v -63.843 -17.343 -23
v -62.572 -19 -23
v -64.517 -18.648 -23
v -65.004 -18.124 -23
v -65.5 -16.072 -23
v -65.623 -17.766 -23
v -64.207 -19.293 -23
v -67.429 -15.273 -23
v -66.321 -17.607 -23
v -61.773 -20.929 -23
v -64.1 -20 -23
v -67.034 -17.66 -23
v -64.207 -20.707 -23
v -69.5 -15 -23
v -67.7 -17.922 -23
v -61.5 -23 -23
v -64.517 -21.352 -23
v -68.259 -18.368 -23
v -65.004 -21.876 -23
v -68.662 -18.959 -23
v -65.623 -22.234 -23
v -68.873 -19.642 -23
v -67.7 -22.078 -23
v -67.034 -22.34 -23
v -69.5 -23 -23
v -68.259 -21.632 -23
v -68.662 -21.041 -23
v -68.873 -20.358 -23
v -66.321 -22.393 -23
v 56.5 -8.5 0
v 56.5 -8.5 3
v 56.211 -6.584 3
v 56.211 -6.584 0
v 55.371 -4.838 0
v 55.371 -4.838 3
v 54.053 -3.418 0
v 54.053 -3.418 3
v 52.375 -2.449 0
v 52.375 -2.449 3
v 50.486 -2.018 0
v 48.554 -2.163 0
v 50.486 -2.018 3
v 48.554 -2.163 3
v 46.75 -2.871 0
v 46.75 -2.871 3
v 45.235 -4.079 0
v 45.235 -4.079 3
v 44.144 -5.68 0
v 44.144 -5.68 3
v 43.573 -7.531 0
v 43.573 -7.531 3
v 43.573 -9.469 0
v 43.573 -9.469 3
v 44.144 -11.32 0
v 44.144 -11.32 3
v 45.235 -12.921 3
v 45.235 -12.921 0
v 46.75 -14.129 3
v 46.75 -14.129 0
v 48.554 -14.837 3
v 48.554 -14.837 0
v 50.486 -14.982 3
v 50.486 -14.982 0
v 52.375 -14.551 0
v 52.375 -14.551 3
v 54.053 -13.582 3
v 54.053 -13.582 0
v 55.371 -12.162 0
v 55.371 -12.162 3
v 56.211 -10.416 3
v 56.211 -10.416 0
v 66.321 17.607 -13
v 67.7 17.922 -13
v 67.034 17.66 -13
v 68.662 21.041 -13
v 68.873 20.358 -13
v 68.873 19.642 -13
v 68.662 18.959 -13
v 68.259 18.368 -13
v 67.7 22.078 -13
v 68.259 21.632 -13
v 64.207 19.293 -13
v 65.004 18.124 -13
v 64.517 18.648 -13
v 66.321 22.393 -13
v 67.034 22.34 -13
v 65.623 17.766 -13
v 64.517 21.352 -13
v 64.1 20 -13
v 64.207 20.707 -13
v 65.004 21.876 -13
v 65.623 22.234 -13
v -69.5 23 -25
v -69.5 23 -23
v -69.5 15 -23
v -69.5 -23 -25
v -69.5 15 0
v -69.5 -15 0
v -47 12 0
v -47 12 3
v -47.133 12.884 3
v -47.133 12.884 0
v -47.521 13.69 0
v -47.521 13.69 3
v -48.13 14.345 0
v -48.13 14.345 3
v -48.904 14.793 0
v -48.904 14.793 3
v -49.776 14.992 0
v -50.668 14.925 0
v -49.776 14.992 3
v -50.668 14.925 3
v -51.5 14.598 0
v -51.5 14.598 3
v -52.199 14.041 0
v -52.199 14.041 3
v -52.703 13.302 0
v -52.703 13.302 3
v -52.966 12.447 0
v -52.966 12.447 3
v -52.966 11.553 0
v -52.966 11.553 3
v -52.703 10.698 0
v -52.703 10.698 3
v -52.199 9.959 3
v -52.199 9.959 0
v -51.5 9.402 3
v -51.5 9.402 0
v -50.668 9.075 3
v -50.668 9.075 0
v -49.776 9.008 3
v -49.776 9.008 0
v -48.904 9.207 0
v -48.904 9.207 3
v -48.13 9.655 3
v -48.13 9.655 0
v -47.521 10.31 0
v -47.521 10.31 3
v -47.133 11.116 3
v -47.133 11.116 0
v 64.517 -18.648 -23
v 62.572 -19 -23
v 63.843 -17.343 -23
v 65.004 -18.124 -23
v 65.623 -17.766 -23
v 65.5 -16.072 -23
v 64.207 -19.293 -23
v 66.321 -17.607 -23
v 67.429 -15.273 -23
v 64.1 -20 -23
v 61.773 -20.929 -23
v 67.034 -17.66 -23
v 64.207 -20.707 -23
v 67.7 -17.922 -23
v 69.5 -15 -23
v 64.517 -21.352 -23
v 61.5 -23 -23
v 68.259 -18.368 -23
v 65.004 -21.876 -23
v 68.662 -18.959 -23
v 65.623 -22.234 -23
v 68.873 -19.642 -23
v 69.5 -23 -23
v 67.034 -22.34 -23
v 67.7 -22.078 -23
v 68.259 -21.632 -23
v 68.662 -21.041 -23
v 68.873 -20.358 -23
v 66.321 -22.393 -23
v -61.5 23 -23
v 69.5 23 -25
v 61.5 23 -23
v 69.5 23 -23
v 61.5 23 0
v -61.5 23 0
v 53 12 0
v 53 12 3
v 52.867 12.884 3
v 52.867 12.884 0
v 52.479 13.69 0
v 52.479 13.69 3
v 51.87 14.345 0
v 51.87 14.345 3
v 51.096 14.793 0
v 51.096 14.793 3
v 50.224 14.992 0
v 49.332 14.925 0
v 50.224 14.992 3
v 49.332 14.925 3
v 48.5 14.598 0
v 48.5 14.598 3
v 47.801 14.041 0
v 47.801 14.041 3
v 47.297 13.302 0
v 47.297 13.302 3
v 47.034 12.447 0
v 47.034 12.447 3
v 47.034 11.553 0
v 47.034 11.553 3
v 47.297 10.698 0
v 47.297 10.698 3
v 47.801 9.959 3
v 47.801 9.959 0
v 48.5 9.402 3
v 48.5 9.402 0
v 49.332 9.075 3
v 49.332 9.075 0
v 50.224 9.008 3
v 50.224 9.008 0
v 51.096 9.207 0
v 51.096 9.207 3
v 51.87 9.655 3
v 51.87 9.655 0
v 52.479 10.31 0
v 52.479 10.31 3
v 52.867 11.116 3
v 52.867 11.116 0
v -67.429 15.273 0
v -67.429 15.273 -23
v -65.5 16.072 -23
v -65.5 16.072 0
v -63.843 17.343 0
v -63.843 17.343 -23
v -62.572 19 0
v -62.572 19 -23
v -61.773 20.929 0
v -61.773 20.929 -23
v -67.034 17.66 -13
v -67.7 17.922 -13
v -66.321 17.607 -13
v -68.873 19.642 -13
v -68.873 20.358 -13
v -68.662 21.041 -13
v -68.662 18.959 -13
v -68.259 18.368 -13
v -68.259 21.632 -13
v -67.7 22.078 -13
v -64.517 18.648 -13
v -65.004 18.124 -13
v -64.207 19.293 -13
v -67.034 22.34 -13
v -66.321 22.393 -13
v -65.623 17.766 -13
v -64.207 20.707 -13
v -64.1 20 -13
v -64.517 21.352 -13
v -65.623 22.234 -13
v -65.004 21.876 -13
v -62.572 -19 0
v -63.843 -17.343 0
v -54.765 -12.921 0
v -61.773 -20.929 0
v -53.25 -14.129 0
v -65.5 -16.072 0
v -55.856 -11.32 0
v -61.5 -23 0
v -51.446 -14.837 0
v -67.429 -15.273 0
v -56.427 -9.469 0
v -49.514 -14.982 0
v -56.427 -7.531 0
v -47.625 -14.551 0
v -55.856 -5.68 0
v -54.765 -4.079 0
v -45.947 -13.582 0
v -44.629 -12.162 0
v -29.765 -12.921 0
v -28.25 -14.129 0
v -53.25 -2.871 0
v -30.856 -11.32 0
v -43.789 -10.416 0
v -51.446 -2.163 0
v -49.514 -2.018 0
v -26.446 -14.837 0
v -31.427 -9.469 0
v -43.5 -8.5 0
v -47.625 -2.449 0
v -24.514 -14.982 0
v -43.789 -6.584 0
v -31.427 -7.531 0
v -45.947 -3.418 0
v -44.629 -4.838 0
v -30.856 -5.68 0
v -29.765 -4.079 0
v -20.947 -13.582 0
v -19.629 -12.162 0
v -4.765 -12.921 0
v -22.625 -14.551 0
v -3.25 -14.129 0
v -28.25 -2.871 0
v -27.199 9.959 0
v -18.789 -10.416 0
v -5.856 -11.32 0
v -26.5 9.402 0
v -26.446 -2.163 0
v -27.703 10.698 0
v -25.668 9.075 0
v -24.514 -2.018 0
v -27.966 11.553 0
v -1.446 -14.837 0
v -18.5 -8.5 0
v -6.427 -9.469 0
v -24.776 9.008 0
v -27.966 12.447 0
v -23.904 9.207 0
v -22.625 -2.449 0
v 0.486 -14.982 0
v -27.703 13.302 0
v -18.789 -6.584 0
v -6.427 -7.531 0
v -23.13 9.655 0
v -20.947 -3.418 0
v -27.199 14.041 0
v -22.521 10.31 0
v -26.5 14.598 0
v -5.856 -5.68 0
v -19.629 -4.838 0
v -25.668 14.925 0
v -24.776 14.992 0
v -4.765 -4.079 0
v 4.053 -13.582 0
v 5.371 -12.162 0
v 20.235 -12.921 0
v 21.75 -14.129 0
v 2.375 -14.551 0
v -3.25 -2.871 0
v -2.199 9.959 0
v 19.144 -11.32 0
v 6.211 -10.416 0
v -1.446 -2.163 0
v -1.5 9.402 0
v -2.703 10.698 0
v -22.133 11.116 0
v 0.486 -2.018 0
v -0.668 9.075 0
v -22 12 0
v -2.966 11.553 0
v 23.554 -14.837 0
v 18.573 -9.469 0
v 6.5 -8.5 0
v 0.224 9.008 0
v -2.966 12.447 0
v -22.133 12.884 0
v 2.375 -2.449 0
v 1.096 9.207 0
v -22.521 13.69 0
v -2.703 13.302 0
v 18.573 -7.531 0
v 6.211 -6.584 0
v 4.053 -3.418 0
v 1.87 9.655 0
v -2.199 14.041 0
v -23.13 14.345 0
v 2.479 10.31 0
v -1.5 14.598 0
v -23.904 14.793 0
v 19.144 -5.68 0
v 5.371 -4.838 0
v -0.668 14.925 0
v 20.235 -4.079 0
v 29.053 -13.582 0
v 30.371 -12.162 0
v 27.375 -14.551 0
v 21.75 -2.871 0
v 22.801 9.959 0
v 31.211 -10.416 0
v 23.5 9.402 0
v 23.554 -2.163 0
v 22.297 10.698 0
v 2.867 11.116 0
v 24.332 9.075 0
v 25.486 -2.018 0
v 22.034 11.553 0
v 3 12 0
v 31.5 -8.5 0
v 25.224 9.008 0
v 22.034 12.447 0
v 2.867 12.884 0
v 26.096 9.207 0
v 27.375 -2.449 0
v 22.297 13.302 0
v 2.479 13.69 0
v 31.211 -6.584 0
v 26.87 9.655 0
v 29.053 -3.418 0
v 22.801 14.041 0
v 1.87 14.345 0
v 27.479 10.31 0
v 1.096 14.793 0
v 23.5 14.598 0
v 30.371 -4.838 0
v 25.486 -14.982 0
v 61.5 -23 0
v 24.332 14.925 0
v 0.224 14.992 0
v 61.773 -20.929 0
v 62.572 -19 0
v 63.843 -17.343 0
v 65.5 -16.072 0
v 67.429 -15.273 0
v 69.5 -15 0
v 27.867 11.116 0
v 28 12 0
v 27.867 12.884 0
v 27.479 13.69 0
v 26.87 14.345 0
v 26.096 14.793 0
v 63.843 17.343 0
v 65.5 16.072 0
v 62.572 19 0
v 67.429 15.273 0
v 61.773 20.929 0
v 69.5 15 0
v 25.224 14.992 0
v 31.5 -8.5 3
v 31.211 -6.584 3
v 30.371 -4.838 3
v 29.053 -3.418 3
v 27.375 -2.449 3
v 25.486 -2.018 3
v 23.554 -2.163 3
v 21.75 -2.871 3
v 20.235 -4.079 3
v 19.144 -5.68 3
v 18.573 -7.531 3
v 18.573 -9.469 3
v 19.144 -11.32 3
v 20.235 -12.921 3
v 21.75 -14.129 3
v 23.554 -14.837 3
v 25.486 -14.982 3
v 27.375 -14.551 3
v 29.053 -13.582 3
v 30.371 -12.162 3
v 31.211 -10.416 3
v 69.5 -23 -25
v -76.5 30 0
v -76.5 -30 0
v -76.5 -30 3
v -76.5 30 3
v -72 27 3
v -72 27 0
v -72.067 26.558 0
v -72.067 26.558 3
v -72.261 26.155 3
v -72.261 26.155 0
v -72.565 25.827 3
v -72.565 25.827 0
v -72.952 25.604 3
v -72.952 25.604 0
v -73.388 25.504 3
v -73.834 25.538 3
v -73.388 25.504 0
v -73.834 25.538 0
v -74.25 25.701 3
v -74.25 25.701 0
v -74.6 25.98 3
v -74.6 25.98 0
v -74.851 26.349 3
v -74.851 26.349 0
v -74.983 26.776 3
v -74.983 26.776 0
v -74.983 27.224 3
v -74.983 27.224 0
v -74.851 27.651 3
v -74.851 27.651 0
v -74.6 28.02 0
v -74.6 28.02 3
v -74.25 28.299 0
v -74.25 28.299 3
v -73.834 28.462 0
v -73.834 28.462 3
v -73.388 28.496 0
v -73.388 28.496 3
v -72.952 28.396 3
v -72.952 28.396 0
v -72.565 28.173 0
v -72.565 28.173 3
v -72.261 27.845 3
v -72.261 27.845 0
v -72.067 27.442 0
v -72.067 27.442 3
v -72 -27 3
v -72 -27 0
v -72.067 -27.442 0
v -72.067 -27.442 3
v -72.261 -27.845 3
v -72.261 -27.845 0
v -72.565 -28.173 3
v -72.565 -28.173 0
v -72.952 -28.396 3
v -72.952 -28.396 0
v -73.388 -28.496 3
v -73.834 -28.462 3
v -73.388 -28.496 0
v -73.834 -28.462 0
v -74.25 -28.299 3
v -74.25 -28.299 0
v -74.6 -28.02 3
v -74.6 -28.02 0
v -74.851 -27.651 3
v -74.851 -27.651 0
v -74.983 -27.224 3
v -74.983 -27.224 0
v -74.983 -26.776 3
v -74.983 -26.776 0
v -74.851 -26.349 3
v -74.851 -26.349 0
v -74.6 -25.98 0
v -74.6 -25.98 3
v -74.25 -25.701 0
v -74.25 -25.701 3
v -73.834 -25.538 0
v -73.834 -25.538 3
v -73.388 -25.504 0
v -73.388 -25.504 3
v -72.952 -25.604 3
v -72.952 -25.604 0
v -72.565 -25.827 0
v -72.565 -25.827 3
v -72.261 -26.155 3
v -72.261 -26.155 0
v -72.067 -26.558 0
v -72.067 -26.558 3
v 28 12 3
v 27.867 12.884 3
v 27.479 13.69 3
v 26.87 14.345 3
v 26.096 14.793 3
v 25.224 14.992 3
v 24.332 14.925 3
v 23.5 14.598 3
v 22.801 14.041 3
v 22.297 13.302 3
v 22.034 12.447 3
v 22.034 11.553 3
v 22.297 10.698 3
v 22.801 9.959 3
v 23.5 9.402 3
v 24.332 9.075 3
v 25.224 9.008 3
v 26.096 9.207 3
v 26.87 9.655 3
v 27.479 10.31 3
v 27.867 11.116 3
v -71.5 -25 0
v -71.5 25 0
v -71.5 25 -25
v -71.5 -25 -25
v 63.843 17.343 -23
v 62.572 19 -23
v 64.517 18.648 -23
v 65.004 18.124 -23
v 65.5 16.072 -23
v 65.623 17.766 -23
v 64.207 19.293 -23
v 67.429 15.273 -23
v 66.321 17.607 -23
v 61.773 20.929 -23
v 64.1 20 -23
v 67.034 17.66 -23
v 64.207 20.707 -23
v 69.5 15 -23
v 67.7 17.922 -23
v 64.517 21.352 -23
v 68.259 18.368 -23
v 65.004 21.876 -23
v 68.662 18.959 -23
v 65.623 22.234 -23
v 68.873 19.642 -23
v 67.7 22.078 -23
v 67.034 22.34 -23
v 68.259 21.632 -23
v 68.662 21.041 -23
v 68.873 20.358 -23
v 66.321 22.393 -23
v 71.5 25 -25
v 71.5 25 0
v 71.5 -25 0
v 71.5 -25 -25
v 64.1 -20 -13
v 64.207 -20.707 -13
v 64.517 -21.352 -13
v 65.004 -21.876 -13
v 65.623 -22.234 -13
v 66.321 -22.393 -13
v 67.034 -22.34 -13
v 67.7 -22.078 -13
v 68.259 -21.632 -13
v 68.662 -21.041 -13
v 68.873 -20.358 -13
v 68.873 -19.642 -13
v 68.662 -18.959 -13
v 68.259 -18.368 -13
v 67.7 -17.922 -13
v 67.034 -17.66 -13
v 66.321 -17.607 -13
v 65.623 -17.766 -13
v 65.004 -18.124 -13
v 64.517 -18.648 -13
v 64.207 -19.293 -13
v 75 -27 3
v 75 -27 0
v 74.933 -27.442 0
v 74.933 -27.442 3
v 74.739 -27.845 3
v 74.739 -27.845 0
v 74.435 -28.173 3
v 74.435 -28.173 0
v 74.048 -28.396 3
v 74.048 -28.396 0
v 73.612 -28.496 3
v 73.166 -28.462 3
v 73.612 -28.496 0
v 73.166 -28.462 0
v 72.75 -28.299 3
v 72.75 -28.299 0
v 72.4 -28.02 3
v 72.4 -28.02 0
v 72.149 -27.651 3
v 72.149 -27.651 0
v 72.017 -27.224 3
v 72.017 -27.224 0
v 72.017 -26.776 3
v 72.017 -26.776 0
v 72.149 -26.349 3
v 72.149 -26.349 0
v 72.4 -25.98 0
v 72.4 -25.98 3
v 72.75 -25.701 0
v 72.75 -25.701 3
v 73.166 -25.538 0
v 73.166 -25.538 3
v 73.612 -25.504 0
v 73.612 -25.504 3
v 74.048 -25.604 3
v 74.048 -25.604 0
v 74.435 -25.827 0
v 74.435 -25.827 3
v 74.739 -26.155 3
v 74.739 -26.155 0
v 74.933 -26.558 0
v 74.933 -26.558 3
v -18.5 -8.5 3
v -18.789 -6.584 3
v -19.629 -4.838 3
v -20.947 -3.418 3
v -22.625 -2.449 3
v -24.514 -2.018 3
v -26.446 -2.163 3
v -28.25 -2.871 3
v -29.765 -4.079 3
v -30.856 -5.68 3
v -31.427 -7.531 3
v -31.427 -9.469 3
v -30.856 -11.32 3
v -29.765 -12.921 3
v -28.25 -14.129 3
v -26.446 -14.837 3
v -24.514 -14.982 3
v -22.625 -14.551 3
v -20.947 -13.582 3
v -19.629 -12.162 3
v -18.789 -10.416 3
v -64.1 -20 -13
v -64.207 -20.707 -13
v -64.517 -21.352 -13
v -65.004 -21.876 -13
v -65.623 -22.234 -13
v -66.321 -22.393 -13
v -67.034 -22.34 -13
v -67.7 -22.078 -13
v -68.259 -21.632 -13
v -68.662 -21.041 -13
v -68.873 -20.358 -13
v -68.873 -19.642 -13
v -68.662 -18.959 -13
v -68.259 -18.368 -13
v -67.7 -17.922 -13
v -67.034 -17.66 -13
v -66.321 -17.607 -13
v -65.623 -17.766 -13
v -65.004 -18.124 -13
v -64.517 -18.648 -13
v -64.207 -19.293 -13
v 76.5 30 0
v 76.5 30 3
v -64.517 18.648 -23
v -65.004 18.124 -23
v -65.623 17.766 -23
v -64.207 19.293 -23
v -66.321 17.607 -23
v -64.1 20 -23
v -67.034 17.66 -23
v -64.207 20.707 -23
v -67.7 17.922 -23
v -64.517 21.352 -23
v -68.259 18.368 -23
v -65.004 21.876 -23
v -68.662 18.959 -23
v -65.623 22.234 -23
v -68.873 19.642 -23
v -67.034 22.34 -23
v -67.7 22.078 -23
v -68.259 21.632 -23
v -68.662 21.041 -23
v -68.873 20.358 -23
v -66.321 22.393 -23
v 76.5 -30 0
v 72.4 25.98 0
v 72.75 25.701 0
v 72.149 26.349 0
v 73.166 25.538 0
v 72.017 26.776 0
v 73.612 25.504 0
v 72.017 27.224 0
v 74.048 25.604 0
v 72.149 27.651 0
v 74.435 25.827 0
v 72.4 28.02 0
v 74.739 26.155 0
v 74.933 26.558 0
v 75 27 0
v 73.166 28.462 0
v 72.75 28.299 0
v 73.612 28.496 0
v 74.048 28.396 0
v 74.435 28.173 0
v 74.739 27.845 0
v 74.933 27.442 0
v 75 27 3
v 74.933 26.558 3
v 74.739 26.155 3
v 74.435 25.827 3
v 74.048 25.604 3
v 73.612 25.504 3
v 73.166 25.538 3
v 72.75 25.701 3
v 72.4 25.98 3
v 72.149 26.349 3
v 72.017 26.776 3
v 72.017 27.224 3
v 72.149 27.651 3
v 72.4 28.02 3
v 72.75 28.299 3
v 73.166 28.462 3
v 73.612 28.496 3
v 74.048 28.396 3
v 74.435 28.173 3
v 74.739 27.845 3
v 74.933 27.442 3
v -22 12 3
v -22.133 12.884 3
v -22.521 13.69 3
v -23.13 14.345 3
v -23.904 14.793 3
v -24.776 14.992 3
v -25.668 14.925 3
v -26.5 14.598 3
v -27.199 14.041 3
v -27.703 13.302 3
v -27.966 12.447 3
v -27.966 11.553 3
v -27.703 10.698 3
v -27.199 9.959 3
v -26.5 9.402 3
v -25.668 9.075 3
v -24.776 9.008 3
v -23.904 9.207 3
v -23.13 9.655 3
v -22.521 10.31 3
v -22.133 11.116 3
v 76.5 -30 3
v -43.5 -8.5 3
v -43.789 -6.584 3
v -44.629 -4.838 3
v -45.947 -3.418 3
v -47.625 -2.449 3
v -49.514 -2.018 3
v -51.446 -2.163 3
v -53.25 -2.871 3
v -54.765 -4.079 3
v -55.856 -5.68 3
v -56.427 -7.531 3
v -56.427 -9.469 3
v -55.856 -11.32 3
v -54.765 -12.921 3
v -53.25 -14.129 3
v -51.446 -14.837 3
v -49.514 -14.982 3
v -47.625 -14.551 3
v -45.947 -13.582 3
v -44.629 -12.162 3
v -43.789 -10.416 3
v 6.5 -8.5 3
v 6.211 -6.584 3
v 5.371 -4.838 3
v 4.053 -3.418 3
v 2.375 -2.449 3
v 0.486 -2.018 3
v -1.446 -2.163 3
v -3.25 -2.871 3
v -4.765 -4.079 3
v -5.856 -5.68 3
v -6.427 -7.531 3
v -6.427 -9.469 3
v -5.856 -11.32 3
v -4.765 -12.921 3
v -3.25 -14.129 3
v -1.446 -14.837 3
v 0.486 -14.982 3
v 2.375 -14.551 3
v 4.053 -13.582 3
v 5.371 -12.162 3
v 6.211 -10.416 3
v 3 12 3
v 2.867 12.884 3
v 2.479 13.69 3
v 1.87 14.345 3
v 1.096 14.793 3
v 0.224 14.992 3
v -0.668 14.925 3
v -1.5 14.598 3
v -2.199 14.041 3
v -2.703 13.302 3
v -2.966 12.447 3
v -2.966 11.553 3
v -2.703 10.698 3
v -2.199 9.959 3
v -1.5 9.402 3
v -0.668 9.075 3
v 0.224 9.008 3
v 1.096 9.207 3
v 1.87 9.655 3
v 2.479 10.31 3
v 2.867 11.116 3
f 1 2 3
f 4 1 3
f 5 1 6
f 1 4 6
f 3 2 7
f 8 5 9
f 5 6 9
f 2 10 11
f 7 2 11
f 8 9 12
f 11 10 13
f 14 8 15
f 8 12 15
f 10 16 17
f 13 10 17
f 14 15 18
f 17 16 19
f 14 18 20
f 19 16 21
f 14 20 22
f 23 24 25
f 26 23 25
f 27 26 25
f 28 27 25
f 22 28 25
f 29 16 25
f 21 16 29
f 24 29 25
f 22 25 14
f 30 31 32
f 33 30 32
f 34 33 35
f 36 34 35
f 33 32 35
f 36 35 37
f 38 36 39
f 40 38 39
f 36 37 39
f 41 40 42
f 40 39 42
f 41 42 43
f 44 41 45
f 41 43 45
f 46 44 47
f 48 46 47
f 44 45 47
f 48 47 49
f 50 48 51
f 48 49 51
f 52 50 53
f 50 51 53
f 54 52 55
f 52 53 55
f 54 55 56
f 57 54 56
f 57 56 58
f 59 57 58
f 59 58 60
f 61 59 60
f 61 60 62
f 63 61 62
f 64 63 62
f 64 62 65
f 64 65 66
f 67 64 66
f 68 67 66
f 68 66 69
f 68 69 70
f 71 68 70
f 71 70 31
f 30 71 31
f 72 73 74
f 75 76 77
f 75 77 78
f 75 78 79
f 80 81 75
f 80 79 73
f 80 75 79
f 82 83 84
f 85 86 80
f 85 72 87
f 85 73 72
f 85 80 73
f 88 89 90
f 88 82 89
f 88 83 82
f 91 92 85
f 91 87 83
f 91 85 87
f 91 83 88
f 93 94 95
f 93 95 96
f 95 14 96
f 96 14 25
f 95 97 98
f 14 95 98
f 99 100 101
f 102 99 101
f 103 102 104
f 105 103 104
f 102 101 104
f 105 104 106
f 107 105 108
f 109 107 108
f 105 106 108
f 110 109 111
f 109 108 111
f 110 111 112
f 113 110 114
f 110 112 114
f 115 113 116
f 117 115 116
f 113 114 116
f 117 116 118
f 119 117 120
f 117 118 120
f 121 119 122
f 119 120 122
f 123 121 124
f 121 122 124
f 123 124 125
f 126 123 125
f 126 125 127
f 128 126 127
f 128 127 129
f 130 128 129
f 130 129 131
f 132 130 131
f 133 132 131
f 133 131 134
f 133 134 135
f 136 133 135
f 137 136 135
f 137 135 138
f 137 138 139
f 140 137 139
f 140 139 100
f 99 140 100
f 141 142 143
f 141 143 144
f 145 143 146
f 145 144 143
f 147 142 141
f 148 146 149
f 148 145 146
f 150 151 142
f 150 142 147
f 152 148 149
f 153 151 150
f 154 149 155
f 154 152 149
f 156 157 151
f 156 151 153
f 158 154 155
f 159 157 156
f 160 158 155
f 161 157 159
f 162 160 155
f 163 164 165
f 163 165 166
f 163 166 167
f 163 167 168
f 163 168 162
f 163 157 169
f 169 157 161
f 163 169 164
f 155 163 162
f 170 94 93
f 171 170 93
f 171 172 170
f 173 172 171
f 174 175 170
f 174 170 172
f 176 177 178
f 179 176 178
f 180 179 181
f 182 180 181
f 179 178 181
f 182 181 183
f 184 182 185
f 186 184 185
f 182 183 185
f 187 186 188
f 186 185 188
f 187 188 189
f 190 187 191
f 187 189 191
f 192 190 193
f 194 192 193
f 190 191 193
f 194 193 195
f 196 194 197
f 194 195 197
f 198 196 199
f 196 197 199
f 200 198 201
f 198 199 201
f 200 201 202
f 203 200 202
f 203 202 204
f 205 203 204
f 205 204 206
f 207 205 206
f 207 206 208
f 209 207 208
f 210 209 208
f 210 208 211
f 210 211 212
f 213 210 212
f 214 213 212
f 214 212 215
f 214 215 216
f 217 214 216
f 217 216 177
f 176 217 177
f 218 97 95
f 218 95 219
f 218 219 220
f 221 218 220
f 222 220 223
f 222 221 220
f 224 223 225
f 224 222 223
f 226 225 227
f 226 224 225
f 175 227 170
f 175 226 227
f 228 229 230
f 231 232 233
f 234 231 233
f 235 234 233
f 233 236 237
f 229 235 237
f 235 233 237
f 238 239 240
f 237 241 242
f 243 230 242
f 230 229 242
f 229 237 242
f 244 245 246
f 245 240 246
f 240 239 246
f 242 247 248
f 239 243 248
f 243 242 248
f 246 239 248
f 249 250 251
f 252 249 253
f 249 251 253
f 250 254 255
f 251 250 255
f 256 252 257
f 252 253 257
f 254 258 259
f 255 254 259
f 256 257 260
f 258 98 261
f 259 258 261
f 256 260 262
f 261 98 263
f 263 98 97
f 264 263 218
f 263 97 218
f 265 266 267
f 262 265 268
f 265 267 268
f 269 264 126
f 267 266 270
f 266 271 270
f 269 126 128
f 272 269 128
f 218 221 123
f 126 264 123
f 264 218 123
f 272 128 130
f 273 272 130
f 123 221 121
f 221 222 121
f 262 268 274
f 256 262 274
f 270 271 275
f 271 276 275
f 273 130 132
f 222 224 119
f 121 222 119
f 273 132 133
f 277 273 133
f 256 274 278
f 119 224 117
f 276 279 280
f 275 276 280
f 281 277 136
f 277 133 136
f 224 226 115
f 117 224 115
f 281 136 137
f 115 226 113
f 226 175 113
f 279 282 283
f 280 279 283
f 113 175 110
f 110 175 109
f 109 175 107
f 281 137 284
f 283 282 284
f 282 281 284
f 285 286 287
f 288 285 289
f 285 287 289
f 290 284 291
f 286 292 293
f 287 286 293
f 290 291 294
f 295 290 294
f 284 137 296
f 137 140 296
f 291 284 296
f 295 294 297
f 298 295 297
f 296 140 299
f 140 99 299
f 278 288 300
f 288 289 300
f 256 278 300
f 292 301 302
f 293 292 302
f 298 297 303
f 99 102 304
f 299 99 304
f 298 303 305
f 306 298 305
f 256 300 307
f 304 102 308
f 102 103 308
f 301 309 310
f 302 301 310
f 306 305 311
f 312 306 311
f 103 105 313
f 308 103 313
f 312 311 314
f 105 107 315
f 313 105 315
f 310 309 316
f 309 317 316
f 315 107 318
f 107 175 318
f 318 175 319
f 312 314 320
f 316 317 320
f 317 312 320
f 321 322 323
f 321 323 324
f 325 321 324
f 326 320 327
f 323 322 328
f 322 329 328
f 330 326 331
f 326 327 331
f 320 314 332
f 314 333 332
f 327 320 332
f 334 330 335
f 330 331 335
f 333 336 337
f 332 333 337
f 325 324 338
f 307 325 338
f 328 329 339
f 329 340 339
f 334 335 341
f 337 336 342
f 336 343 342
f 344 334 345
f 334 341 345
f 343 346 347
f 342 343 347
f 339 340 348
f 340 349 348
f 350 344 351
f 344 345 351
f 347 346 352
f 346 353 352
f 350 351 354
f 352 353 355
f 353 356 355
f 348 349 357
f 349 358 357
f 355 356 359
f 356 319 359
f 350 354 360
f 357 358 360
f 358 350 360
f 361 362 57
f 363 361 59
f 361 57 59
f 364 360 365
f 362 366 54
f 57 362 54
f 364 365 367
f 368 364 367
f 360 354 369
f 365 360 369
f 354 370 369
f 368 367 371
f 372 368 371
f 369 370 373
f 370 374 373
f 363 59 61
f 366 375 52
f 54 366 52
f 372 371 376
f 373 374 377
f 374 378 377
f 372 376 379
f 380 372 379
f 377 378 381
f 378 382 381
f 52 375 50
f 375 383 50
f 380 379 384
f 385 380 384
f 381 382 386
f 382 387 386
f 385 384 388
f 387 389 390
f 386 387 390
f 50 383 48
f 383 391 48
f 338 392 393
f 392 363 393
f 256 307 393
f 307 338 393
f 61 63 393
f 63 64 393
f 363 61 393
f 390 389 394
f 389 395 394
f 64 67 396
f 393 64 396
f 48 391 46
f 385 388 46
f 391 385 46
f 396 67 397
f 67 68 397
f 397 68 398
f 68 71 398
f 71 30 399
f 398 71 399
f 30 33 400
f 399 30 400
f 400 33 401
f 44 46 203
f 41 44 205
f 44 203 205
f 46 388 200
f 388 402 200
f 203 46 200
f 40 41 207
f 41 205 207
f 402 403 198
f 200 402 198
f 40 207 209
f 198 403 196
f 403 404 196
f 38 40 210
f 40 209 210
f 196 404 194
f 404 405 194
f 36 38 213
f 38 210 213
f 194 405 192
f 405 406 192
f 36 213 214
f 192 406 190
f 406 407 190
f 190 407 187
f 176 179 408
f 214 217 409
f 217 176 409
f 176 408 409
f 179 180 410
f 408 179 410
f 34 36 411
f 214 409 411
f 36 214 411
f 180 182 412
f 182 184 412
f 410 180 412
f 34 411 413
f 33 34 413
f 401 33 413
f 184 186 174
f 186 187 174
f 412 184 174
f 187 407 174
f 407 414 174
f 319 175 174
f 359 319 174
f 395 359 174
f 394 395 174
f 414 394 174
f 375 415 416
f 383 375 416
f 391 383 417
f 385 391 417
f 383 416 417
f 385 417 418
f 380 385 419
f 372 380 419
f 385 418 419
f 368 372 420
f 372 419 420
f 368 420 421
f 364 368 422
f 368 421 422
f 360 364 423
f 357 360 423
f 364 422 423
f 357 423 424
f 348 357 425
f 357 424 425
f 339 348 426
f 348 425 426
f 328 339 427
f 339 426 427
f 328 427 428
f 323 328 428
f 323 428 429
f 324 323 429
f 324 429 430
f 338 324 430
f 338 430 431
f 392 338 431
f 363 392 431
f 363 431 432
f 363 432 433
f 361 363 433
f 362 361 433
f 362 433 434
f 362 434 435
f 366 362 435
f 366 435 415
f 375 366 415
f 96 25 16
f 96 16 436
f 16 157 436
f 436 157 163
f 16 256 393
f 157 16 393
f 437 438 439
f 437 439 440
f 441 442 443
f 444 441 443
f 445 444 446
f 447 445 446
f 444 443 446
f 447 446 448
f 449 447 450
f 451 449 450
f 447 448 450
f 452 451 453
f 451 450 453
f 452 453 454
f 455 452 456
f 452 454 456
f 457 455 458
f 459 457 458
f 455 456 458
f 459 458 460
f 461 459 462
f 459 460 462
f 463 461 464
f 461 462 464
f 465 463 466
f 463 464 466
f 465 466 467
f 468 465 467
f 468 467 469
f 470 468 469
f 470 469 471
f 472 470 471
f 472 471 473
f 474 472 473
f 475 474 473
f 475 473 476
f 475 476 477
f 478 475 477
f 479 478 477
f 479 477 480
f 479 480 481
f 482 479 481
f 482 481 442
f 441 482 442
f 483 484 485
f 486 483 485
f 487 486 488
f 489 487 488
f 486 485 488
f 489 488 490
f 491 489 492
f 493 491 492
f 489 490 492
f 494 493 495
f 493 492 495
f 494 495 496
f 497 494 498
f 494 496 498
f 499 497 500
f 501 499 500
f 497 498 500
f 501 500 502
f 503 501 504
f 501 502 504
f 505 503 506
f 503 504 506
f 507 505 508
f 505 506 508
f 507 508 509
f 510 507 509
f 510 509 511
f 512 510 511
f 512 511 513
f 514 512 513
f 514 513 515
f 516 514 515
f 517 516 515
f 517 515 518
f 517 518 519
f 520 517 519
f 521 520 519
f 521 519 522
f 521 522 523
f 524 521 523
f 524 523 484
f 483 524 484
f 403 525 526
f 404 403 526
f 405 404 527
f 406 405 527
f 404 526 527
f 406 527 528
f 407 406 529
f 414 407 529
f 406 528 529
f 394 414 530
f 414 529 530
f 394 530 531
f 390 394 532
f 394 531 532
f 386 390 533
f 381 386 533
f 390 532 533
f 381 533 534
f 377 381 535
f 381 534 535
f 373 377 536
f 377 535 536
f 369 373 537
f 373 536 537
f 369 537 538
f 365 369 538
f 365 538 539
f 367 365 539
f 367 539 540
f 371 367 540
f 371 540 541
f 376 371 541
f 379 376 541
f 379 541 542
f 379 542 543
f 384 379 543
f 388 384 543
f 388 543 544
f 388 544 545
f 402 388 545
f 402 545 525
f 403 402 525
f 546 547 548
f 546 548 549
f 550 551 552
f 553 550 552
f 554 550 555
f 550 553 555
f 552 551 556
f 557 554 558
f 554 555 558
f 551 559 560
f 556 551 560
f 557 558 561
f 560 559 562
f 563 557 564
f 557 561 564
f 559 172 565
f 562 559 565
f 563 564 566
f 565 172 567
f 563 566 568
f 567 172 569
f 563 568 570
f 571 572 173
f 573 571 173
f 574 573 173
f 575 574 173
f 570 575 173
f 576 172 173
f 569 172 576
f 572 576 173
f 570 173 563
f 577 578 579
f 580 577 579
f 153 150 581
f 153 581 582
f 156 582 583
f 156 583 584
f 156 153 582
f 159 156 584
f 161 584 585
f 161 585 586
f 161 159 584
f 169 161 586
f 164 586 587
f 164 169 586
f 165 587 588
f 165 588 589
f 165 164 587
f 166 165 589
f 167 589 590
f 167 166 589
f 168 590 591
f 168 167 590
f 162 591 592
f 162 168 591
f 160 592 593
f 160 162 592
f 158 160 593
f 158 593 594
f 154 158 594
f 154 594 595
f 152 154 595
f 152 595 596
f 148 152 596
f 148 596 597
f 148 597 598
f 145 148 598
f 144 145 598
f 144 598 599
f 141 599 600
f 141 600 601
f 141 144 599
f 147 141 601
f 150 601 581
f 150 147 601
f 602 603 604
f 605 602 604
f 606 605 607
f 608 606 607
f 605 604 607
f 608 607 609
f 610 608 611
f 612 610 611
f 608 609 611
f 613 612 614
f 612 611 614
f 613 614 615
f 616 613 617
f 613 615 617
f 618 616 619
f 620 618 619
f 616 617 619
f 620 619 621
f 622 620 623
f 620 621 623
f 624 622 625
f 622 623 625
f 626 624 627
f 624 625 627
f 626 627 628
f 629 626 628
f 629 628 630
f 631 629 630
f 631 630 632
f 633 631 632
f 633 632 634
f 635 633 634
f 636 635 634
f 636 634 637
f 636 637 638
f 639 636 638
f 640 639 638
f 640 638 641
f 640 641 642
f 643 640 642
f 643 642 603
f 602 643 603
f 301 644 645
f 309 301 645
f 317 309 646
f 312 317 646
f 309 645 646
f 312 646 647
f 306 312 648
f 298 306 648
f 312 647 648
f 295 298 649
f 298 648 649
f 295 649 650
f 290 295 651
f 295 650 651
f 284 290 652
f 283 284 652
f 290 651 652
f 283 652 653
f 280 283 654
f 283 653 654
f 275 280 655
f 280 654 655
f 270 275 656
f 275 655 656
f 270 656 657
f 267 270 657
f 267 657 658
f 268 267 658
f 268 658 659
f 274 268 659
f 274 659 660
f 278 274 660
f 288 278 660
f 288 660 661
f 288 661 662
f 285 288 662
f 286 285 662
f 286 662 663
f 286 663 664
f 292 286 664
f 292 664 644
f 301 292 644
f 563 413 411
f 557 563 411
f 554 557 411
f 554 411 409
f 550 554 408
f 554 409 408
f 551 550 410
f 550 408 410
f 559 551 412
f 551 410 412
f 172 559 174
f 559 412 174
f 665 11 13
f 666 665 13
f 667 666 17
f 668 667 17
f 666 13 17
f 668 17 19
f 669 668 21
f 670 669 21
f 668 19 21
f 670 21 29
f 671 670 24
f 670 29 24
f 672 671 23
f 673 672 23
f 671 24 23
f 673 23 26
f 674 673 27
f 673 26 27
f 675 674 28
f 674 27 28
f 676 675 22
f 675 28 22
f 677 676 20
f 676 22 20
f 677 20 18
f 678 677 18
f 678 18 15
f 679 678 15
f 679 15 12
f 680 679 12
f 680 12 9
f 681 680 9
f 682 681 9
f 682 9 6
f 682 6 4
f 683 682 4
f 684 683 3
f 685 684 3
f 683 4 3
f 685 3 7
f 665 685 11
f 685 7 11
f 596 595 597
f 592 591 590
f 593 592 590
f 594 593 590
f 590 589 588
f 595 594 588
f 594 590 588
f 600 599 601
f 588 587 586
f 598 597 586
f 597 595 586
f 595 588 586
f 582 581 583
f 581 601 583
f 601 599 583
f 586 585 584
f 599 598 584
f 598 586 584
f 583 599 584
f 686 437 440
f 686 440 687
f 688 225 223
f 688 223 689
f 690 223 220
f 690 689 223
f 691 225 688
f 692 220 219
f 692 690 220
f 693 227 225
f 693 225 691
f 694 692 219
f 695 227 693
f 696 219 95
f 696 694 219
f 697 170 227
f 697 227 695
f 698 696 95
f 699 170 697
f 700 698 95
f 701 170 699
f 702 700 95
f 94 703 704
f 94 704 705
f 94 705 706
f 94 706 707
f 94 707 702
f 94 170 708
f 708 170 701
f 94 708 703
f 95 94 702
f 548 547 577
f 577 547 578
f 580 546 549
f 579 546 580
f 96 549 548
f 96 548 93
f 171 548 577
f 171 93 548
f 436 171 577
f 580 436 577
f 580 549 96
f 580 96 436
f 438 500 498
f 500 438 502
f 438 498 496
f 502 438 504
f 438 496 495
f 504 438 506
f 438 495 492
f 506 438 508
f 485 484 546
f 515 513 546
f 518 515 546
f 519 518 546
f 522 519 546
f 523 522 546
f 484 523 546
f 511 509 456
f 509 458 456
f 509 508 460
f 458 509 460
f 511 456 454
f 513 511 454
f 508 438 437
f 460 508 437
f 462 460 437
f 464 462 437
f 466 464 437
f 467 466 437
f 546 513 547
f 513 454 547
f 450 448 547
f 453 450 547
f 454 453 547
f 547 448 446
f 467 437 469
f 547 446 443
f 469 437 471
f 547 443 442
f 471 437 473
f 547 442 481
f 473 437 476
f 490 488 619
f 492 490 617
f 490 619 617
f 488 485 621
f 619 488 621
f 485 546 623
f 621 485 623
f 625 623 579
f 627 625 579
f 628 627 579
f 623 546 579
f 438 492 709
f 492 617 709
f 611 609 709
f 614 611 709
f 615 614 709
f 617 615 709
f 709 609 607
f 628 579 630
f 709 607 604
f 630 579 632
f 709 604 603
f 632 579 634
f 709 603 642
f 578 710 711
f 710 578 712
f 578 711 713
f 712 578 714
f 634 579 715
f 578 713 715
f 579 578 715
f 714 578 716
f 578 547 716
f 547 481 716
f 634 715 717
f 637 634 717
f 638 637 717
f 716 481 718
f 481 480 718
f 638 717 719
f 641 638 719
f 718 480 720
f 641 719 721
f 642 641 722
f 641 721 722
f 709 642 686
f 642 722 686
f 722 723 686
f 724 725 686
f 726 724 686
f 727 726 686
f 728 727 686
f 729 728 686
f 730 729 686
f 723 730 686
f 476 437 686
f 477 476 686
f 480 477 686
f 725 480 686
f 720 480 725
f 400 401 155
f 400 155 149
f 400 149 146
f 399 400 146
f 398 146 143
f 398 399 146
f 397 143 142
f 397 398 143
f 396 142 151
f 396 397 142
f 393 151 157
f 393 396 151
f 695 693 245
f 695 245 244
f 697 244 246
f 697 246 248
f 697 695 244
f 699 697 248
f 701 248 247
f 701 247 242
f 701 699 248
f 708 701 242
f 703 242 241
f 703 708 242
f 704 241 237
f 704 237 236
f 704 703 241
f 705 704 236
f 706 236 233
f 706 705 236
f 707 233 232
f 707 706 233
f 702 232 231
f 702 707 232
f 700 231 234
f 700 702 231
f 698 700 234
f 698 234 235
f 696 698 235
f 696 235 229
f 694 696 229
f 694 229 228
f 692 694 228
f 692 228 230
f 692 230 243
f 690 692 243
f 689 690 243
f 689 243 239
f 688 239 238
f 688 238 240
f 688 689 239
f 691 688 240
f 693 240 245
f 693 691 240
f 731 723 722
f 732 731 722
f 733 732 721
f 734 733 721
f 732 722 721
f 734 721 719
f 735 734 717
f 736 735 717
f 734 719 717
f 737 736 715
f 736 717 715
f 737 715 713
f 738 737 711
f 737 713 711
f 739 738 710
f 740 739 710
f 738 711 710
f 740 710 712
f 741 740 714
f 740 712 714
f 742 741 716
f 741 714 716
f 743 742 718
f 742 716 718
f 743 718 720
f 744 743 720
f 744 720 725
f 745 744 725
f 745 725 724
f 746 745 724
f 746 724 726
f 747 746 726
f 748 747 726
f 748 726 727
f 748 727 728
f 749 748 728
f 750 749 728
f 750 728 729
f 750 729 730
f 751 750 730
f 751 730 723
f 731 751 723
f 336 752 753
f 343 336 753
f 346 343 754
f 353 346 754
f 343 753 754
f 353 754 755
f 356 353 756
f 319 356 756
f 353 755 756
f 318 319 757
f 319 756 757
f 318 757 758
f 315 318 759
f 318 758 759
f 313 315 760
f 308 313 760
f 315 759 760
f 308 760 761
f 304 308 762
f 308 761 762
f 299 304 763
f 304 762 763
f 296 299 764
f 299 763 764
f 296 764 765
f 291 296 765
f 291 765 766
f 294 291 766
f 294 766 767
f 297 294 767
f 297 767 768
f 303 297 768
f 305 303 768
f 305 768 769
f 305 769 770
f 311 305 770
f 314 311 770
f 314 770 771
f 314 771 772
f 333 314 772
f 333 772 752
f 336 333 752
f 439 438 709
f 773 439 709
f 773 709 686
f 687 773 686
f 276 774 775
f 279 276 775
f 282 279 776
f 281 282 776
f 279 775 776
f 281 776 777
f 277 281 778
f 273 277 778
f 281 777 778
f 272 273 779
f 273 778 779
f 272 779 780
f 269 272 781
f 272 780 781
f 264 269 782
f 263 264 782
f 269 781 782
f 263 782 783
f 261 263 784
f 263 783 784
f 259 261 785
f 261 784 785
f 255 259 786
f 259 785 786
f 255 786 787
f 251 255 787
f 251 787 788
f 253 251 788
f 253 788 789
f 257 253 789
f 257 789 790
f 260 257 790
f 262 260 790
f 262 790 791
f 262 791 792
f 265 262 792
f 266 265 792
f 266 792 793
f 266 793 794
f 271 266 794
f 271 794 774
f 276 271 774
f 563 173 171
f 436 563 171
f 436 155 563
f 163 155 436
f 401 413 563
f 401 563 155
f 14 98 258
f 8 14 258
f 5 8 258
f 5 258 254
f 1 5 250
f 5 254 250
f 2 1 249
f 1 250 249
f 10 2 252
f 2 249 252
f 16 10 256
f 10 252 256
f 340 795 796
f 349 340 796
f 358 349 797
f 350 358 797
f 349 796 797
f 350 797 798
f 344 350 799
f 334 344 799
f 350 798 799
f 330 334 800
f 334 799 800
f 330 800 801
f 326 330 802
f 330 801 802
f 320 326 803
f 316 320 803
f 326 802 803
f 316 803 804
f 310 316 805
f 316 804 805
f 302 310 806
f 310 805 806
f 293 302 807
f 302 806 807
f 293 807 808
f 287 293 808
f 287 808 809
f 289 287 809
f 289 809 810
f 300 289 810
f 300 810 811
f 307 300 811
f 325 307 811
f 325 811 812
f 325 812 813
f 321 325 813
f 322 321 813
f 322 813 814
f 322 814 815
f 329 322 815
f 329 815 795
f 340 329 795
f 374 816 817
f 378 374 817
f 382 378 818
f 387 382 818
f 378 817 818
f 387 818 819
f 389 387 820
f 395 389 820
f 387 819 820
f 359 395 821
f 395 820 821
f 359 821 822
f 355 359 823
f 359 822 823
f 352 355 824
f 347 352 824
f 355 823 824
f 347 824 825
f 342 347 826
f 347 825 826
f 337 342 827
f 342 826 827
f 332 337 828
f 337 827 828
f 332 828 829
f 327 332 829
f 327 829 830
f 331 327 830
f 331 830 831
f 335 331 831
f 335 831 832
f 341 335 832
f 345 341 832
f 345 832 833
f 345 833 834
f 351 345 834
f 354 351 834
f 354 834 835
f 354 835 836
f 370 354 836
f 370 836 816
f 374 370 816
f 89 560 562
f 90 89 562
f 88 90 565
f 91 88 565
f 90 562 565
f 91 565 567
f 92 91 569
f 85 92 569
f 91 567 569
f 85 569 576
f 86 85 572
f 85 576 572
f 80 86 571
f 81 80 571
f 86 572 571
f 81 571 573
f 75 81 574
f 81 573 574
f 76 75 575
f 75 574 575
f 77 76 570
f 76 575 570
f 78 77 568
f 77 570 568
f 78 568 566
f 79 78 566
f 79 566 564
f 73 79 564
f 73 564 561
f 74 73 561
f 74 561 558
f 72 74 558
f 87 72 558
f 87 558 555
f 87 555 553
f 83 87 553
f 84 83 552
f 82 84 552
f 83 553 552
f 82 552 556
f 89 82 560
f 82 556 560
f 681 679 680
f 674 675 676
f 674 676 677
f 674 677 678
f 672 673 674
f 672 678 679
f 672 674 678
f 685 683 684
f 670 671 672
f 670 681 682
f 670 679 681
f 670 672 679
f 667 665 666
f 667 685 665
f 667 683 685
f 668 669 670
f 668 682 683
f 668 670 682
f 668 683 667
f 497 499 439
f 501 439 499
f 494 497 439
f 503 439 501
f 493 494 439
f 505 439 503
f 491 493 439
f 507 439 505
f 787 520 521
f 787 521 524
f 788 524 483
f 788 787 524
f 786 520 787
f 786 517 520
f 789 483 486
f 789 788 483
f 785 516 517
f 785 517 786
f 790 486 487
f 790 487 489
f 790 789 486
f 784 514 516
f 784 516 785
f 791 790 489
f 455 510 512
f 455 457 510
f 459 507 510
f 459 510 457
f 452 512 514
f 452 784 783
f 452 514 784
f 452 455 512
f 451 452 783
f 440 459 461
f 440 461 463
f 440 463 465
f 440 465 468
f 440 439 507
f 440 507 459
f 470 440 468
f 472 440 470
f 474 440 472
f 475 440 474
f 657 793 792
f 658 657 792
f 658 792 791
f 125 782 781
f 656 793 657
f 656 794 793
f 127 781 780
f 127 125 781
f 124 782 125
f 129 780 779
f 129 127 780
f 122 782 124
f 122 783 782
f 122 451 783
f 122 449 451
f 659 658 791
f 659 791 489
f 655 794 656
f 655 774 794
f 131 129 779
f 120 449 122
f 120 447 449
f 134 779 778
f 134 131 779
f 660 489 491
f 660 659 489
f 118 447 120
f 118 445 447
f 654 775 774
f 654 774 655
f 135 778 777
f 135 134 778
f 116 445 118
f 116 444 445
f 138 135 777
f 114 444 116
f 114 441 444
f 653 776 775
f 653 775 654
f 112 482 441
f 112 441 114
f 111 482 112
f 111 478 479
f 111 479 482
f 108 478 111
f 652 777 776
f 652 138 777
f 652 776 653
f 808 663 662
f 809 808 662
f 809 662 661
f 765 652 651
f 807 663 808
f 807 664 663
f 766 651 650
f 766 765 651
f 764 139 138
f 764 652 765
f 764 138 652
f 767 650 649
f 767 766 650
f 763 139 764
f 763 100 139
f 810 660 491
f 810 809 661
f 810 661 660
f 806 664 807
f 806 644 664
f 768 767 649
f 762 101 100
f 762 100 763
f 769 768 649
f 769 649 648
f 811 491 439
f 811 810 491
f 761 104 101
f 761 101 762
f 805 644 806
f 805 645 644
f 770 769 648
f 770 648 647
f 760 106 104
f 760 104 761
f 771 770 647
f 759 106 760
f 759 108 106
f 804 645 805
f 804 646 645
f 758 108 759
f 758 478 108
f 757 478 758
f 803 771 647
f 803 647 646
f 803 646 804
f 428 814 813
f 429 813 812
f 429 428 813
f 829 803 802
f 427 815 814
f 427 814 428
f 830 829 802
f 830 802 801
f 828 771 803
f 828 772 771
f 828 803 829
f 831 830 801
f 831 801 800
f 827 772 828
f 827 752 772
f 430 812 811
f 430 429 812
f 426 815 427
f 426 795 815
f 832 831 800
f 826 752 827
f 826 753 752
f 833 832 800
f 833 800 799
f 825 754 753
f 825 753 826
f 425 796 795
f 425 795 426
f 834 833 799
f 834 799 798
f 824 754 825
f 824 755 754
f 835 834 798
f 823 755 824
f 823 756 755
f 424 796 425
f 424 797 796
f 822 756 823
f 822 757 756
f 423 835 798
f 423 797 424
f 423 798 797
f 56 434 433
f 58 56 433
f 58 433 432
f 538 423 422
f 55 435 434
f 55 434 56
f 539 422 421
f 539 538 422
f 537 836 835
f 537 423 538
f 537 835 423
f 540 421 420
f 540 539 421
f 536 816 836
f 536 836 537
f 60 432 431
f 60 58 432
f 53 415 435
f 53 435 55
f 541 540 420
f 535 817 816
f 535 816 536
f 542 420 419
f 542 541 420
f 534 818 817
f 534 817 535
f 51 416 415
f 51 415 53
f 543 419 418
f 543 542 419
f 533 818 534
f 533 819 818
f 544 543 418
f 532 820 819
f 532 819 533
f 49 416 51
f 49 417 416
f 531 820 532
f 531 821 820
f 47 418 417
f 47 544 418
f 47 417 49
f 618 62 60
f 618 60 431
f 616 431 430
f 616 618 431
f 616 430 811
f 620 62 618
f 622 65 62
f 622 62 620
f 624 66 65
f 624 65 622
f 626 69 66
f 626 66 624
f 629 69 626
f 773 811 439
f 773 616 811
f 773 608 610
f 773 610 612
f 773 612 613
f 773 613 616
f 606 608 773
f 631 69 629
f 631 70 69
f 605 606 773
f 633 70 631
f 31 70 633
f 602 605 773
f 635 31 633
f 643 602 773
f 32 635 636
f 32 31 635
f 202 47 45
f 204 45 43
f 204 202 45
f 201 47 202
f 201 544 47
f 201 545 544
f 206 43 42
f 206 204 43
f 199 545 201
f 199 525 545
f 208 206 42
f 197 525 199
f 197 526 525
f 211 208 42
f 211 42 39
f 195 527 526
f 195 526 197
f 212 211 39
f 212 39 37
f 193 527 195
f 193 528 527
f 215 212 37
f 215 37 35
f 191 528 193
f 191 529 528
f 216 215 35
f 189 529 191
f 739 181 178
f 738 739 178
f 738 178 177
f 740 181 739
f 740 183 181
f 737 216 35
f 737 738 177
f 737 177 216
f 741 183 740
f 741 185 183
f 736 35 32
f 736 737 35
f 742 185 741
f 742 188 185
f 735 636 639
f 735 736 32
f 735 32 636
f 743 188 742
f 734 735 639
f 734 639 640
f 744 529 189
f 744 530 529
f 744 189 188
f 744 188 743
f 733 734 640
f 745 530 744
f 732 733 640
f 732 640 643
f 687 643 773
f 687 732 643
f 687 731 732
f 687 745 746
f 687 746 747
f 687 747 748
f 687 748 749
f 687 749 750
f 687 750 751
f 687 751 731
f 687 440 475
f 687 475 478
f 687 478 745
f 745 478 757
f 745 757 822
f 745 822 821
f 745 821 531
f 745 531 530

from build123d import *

# Parameters (mm, degrees)
SKETCH_W                      = 153
SKETCH_H                      = 60
PAD_DEPTH                     = 3
SKETCH002_W                   = 143
SKETCH002_H                   = 50
SKETCH002_W_2                 = 139
SKETCH002_H_2                 = 46
PAD001_DEPTH                  = 25
SKETCH003_R                   = 1.5
POCKET_DEPTH                  = 3.001
PAD002_DEPTH                  = 23
PAD002_MIRRORED_2_DEPTH       = 23
SKETCH005_R                   = 2.4
POCKET001_DEPTH               = 10
SKETCH005_MIRRORED002_2_R     = 2.4
POCKET001_MIRRORED002_2_DEPTH = 10
SKETCH006_R                   = 6.5
SKETCH006_R_2                 = 3
POCKET002_DEPTH               = 28.001


with BuildPart() as part:
    # Sketch → Pad (new body)
    with BuildSketch(Plane.XY):
        Rectangle(SKETCH_W, SKETCH_H)
    extrude(amount=PAD_DEPTH)

    # Sketch002 (on Face5 of Pad) → Pad001 (join)
    with BuildSketch(Plane(origin=(0, 0, 0), x_dir=(1, 0, 0), z_dir=(0, 0, -1))):
        Rectangle(SKETCH002_W, SKETCH002_H)
        Rectangle(SKETCH002_W_2, SKETCH002_H_2, mode=Mode.SUBTRACT)
    extrude(amount=PAD001_DEPTH)

    # Sketch003 (on Face4 of Pad001) → Pocket (cut, through all)
    with BuildSketch(Plane(origin=(0, 0, 0), x_dir=(1, 0, 0), z_dir=(0, 0, -1))):
        with Locations((-73.5, 27)):
            Circle(SKETCH003_R)
        with Locations((-73.5, -27)):
            Circle(SKETCH003_R)
        with Locations((73.5, -27)):
            Circle(SKETCH003_R)
        with Locations((73.5, 27)):
            Circle(SKETCH003_R)
    extrude(amount=-POCKET_DEPTH, mode=Mode.SUBTRACT)

    # Sketch004 (on Face20 of Pocket) → Pad002 (join)
    with BuildSketch(Plane(origin=(0, 0, 0), x_dir=(1, 0, 0), z_dir=(0, 0, -1))):
        with BuildLine():
            Line((-69.5, 23), (-61.5, 23))
            ThreePointArc((-69.5, 15), (-63.843146, 17.343146), (-61.5, 23))
            Line((-69.5, 23), (-69.5, 15))
        make_face()
    pad002 = extrude(amount=PAD002_DEPTH)

    # Sketch004 Mirrored 2 → Pad002 Mirrored 2 (add)
    with BuildSketch(Plane(origin=(0, 0, 0), x_dir=(-1, 0, 0), z_dir=(0, 0, 1))):
        with BuildLine():
            Line((-69.5, 23), (-61.5, 23))
            ThreePointArc((-69.5, 15), (-63.843146, 17.343146), (-61.5, 23))
            Line((-69.5, 23), (-69.5, 15))
        make_face()
    pad002_mirrored_2 = extrude(amount=-PAD002_MIRRORED_2_DEPTH)

    # Mirrored001: Pad002, Pad002 Mirrored 2 across Sketch004 H_Axis
    add(pad002.mirror(Plane(origin=(0, 0, 0), x_dir=(0, 0, -1), z_dir=(0, -1, 0))))
    add(pad002_mirrored_2.mirror(Plane(origin=(0, 0, 0), x_dir=(0, 0, -1), z_dir=(0, -1, 0))))

    # Sketch005 (on Face20 of MultiTransform) → Pocket001 (cut)
    with BuildSketch(Plane(origin=(0, 0, -23), x_dir=(1, 0, 0), z_dir=(0, 0, -1))):
        with Locations((-66.5, 20)):
            Circle(SKETCH005_R)
    pocket001 = extrude(amount=-POCKET001_DEPTH, mode=Mode.SUBTRACT)

    # Sketch005 Mirrored002 2 → Pocket001 Mirrored002 2 (cut)
    with BuildSketch(Plane(origin=(0, 0, -23), x_dir=(-1, 0, 0), z_dir=(0, 0, 1))):
        with Locations((-66.5, 20)):
            Circle(SKETCH005_MIRRORED002_2_R)
    pocket001_mirrored002_2 = extrude(amount=POCKET001_MIRRORED002_2_DEPTH, mode=Mode.SUBTRACT)

    # Mirrored003: Pocket001, Pocket001 Mirrored002 2 across Sketch005 H_Axis
    add(pocket001.mirror(Plane(origin=(0, 0, -23), x_dir=(0, 0, -1), z_dir=(0, -1, 0))), mode=Mode.SUBTRACT)
    add(pocket001_mirrored002_2.mirror(Plane(origin=(0, 0, -23), x_dir=(0, 0, -1), z_dir=(0, -1, 0))), mode=Mode.SUBTRACT)

    # Sketch006 (on Face5 of MultiTransform001) → Pocket002 (cut, through all)
    with BuildSketch(Plane.XY.offset(3)):
        with Locations((-50, -8.5)):
            Circle(SKETCH006_R)
        with Locations((-25, -8.5)):
            Circle(SKETCH006_R)
        with Locations((0, -8.5)):
            Circle(SKETCH006_R)
        with Locations((25, -8.5)):
            Circle(SKETCH006_R)
        with Locations((50, -8.5)):
            Circle(SKETCH006_R)
        with Locations((-50, 12)):
            Circle(SKETCH006_R_2)
        with Locations((-25, 12)):
            Circle(SKETCH006_R_2)
        with Locations((0, 12)):
            Circle(SKETCH006_R_2)
        with Locations((25, 12)):
            Circle(SKETCH006_R_2)
        with Locations((50, 12)):
            Circle(SKETCH006_R_2)
    extrude(amount=-POCKET002_DEPTH, mode=Mode.SUBTRACT)


solid = part.part
